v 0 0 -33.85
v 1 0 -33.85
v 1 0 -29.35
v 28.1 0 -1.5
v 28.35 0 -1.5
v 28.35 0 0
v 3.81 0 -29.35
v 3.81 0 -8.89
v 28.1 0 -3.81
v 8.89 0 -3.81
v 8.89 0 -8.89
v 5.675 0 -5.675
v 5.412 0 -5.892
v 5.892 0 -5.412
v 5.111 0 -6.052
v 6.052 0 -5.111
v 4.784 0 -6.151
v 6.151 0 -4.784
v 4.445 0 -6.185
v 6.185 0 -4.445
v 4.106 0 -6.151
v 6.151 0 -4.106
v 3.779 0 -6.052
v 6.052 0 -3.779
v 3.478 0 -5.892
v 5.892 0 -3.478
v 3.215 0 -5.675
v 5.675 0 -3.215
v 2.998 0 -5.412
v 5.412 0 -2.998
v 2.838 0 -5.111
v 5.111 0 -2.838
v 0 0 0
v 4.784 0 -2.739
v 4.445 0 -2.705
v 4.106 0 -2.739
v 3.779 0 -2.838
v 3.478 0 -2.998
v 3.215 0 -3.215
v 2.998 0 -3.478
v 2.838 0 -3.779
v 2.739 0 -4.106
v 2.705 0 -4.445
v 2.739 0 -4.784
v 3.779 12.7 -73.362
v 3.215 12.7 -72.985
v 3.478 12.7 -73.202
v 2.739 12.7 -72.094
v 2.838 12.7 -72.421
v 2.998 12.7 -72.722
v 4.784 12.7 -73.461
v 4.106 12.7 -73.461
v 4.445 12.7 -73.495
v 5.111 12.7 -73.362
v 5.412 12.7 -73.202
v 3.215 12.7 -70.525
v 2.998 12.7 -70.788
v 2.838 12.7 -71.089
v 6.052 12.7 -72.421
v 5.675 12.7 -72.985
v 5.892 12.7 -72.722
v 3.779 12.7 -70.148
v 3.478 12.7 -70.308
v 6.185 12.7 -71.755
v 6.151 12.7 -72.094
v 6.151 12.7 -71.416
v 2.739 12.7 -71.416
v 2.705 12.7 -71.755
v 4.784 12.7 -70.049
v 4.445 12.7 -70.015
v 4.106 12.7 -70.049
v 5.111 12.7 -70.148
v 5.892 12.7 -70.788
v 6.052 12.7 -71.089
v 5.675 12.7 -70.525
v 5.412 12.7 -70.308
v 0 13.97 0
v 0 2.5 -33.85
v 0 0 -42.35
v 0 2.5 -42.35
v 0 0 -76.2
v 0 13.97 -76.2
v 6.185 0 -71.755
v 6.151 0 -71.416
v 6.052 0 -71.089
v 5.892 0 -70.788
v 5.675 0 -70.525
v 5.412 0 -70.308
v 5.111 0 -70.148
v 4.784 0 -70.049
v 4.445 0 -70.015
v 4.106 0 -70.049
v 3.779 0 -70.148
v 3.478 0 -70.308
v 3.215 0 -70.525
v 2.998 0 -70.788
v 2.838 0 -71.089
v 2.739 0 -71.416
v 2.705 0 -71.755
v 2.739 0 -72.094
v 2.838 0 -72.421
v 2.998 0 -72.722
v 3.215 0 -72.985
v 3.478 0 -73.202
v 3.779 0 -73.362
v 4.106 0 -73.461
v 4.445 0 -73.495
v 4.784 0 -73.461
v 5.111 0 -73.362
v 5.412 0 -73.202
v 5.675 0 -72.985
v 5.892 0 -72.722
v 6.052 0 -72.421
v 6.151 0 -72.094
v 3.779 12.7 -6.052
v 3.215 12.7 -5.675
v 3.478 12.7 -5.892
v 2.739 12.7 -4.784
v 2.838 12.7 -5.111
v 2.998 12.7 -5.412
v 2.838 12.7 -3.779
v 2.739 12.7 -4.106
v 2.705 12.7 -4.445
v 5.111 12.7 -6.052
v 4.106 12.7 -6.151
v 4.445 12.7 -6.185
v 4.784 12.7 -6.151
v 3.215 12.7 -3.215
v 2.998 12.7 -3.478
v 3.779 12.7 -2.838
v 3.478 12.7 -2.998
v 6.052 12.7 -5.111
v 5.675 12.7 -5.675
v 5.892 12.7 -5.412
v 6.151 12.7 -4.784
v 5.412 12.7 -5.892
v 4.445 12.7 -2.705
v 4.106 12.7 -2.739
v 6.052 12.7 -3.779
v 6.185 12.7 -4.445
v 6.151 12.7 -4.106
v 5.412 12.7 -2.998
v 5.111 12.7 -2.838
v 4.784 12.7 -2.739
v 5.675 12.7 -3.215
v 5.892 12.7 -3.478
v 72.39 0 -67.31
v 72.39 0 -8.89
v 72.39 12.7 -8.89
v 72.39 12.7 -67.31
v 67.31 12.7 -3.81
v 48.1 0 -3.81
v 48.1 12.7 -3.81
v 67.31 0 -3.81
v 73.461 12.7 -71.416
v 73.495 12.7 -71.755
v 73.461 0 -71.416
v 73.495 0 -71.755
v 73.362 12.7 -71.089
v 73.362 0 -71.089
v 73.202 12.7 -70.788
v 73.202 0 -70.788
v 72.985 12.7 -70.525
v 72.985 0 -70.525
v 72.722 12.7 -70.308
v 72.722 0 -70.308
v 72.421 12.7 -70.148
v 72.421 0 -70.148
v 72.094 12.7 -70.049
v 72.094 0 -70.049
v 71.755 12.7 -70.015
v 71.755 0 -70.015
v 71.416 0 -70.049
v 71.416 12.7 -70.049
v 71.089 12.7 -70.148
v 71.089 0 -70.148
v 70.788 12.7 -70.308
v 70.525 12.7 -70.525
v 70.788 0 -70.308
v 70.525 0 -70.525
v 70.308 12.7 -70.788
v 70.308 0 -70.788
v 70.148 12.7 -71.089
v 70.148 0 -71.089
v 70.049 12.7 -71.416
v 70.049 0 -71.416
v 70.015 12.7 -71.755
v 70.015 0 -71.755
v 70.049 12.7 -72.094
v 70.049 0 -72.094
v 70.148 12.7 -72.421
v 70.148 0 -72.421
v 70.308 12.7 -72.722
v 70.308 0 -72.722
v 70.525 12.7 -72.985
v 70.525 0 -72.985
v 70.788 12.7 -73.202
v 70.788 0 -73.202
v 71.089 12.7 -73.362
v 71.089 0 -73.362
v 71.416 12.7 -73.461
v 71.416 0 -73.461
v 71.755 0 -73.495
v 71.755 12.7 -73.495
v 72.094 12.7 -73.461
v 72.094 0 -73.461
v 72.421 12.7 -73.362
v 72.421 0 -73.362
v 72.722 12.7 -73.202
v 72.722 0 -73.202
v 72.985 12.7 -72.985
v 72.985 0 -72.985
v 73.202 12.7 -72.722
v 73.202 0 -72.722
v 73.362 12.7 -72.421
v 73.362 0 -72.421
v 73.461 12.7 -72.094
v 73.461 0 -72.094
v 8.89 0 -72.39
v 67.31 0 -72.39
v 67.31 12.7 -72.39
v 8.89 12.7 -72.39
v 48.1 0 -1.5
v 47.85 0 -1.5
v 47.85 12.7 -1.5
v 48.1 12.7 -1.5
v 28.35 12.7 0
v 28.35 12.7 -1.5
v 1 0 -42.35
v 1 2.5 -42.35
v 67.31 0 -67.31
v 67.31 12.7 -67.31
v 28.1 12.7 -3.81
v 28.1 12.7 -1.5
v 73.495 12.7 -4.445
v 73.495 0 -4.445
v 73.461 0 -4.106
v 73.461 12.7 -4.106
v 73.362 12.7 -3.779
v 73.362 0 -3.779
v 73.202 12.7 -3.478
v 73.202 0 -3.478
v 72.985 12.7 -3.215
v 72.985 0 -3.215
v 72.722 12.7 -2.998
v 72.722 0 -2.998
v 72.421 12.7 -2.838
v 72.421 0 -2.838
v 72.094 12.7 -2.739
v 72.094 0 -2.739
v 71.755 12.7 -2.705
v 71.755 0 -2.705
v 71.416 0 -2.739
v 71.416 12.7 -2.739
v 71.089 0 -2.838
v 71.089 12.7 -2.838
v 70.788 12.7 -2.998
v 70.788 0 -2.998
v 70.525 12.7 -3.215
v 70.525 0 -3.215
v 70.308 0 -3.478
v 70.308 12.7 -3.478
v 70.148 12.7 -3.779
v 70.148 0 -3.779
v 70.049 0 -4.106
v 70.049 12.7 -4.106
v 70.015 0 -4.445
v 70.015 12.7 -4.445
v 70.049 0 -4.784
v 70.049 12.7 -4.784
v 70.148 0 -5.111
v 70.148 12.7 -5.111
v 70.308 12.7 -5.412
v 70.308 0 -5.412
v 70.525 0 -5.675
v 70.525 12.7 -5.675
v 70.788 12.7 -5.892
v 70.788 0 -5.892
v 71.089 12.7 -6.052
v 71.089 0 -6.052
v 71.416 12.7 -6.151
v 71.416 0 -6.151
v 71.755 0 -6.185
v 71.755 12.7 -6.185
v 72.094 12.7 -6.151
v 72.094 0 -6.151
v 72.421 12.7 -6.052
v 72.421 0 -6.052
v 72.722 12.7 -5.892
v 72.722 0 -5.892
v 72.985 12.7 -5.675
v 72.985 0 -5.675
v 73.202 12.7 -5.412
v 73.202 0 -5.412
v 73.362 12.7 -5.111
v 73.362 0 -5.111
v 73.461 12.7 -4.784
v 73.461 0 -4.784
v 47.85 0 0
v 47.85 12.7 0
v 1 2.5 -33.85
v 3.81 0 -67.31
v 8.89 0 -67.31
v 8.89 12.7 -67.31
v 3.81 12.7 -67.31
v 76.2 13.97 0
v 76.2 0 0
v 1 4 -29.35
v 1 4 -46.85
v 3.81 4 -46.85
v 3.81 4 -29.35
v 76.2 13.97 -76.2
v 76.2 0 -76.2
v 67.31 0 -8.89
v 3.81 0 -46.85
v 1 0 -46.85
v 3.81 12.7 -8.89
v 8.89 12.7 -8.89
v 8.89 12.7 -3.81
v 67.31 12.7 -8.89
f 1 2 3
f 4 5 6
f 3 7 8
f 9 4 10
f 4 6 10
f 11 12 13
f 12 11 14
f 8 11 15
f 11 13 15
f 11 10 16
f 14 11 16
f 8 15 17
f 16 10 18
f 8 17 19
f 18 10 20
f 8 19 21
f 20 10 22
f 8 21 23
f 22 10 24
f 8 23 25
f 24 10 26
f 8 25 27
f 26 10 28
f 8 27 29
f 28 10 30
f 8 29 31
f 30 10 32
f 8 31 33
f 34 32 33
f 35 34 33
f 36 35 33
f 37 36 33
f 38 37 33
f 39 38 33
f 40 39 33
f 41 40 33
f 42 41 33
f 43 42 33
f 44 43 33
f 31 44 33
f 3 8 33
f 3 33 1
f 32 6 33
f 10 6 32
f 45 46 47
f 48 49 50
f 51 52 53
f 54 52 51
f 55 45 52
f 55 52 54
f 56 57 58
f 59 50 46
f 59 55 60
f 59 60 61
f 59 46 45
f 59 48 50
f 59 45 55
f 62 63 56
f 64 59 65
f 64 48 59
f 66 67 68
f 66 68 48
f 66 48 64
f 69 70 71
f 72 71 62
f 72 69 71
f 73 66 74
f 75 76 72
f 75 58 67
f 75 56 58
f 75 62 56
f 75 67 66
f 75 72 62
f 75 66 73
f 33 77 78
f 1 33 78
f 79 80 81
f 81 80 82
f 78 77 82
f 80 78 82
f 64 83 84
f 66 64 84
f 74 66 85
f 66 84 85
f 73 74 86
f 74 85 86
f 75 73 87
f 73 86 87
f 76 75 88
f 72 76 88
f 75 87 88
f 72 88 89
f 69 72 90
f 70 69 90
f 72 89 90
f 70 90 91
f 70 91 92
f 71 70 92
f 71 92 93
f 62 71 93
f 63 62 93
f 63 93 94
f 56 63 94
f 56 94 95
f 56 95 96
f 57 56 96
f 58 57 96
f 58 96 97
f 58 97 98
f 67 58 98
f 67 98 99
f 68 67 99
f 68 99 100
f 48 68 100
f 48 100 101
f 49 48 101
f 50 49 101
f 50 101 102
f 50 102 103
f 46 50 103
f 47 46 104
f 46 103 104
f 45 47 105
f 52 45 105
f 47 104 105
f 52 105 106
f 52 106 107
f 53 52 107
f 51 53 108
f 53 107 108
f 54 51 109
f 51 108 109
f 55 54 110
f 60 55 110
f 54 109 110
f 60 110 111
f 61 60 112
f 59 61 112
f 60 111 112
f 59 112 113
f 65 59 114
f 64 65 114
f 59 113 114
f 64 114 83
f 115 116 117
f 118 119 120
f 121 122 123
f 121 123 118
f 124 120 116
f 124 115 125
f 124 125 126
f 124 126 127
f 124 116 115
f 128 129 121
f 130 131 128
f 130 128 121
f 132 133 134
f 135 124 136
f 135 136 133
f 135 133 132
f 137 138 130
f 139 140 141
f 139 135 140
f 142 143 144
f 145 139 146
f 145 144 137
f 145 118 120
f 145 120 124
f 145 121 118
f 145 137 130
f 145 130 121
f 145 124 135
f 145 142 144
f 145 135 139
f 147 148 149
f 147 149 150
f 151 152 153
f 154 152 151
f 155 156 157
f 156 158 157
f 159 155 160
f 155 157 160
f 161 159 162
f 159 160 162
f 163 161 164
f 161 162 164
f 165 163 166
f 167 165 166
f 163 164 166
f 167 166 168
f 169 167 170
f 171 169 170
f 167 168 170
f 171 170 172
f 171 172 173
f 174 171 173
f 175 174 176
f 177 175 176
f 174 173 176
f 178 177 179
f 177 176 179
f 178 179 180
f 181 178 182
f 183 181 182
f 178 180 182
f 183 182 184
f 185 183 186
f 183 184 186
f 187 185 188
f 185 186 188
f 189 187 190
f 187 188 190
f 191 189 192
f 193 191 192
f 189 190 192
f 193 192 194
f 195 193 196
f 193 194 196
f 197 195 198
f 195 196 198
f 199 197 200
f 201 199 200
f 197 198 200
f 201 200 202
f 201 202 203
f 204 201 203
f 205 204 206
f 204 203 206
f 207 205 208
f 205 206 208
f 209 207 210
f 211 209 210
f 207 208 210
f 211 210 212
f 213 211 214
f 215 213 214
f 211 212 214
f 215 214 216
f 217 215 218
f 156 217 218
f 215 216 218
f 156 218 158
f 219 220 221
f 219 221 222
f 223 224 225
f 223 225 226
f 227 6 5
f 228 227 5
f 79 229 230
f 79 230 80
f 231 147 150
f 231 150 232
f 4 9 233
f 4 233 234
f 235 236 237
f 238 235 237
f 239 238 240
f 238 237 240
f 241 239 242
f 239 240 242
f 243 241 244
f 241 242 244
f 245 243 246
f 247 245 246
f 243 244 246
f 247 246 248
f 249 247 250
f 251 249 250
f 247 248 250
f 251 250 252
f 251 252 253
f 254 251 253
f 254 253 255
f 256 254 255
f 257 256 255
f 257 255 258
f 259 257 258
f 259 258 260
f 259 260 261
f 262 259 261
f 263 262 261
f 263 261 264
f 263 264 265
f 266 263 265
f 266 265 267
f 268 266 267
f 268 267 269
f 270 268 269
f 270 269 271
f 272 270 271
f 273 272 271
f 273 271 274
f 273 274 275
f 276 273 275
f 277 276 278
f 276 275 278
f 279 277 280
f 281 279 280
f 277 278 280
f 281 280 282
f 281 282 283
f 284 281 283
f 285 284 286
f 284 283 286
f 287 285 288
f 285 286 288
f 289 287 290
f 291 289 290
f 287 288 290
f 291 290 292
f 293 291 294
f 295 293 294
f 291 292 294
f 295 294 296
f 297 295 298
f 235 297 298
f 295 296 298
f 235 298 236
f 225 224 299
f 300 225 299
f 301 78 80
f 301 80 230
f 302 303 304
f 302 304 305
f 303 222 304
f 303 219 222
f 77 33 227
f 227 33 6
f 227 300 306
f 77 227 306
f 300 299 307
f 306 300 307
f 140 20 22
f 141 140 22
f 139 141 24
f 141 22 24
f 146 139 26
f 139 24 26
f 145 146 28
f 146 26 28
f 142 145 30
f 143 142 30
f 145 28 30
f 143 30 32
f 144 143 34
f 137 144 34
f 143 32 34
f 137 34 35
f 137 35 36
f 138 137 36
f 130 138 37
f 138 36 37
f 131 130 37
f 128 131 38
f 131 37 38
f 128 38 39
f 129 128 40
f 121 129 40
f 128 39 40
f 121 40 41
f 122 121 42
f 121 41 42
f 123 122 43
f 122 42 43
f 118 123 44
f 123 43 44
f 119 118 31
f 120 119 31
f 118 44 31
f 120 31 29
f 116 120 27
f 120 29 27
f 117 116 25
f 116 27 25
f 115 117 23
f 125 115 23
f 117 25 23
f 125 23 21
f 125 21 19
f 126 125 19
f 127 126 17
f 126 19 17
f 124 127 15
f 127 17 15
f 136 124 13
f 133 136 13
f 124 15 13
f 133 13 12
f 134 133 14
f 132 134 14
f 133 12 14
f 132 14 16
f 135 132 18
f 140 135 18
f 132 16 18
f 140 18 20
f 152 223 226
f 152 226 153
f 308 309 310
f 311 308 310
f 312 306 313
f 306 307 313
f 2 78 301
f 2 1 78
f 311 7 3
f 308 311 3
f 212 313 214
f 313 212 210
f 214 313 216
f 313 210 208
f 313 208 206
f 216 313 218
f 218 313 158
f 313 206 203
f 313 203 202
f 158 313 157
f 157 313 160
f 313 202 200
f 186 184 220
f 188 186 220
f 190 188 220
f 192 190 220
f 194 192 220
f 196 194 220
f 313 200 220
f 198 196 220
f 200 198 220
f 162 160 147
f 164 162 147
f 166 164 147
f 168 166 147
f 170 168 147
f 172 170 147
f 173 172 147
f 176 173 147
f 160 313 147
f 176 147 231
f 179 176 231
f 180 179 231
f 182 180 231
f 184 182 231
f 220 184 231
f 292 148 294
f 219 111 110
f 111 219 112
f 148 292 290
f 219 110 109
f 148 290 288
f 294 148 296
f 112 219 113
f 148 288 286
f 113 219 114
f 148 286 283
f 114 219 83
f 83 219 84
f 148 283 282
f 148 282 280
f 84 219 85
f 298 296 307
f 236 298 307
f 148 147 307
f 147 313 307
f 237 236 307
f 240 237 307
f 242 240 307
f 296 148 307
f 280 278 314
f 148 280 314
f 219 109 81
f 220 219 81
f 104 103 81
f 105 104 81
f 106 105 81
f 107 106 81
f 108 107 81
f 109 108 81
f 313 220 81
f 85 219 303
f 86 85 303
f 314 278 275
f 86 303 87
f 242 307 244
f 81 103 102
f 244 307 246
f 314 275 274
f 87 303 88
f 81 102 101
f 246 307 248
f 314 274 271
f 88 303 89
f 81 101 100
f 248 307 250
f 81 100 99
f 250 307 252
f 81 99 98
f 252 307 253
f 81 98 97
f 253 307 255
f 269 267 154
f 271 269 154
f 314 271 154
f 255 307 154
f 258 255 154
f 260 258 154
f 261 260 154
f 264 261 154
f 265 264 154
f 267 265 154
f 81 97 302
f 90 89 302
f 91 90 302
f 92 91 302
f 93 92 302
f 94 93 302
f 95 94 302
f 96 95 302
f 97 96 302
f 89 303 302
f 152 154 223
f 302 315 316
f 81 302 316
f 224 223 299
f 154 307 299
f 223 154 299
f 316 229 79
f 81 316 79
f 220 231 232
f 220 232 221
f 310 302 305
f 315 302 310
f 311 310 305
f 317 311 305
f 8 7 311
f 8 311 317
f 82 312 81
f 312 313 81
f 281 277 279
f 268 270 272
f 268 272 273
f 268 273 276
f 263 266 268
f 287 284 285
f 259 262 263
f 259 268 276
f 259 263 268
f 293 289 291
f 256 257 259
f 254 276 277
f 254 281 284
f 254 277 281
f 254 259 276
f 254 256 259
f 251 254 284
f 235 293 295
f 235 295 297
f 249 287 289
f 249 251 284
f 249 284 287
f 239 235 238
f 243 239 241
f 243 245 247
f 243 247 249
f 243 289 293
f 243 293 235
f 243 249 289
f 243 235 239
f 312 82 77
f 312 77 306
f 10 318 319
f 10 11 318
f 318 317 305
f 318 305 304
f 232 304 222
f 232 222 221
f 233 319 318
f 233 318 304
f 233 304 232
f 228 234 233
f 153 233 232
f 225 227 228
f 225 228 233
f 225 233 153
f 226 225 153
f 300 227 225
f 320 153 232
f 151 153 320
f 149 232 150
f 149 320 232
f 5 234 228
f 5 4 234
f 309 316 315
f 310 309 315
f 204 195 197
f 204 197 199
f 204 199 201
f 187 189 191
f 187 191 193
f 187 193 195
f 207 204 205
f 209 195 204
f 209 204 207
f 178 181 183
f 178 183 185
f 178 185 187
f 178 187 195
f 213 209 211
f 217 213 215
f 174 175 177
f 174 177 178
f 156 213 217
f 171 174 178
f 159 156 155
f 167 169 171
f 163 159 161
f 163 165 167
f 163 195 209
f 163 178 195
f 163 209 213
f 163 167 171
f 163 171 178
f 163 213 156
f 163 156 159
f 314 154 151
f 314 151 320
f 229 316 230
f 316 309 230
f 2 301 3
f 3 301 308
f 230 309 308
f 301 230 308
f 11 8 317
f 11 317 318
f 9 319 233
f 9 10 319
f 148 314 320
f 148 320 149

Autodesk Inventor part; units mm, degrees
ref_plane "YZ Plane" through (0, 0, 0) normal (1, 0, 0) x (0, 1, 0)
ref_plane "XZ Plane" through (0, 0, 0) normal (0, 1, 0) x (-1, 0, 0)
ref_plane "XY Plane" through (0, 0, 0) normal (0, 0, 1) x (1, 0, 0)
sketch "Sketch1" plane through (0, 0, 0) normal (0, 1, 0) x (-1, 0, 0)
  line L0 (0, 0) -> (-76.2, 0)
  line L1 (-76.2, 0) -> (-76.2, -76.2)
  line L2 (-76.2, -76.2) -> (0, -76.2)
  line L3 (0, -76.2) -> (0, 0)
  line L4 (-8.89, -8.89) -> (-67.31, -8.89)
  line L5 (-67.31, -8.89) -> (-67.31, -67.31)
  line L6 (-67.31, -67.31) -> (-8.89, -67.31)
  line L7 (-8.89, -67.31) -> (-8.89, -8.89)
  line L8 (-8.89, -8.89) -> (-67.31, -67.31) construction
  line L9 (-67.31, -8.89) -> (-8.89, -67.31) construction
  point P0 (-38.1, -38.1)
  dimension "d0" = 76.2
  dimension "d1" = 76.2
  dimension "d2" = 58.42
  dimension "d3" = 58.42
extrude "Extrusion1" add sketch "Sketch1" along normal blind 12.7
sketch "Sketch2" plane through (0, 12.7, 0) normal (0, 1, 0) x (1, 0, 0)
  line L0 (0, 76.2) -> (0, 0) projected
  line L1 (76.2, 0) -> (76.2, 76.2) projected
  line L2 (0, 0) -> (76.2, 0)
  line L3 (76.2, 0) -> (76.2, 76.2)
  line L4 (76.2, 76.2) -> (0, 76.2)
  line L5 (0, 76.2) -> (0, 0)
extrude "Extrusion2" add sketch "Sketch2" along normal blind 1.27
sketch "Sketch3" plane through (0, 0, 0) normal (0, -1, 0) x (1, 0, 0)
  line L0 (67.31, -67.31) -> (67.31, -8.89) construction
  line L1 (76.2, 0) -> (76.2, -76.2) construction
  line L2 (67.31, -8.89) -> (76.2, 0) construction
  line L3 (67.31, -67.31) -> (76.2, -76.2) construction
  line L4 (8.89, -67.31) -> (0, -76.2) construction
  line L5 (8.89, -8.89) -> (8.89, -67.31) construction
  line L6 (8.89, -8.89) -> (0, 0) construction
  circle A0 centre (71.755, -4.445) radius 1.7399
  circle A1 centre (71.755, -71.755) radius 1.7399
  circle A2 centre (4.445, -4.445) radius 1.7399
  circle A3 centre (4.445, -71.755) radius 1.7399
  dimension "d8" = 3.4798
  dimension "d9" = 3.4798
  dimension "d10" = 3.4798
  dimension "d11" = 3.4798
extrude "Extrusion3" cut sketch "Sketch3" against normal blind 12.7
sketch "Sketch4" plane through (0, 0, 0) normal (0, -1, 0) x (1, 0, 0)
  line L0 (67.31, -67.31) -> (67.31, -8.89) projected
  line L1 (67.31, -8.89) -> (72.39, -8.89)
  line L2 (72.39, -8.89) -> (72.39, -67.31)
  line L3 (72.39, -67.31) -> (67.31, -67.31)
  line L4 (67.31, -67.31) -> (67.31, -8.89)
  circle A0 centre (38.1, -38.1) radius 2.0553 construction
  line L5 (8.89, -3.81) -> (67.31, -3.81)
  line L6 (8.89, -8.89) -> (8.89, -3.81)
  line L7 (67.31, -8.89) -> (8.89, -8.89)
  line L8 (67.31, -3.81) -> (67.31, -8.89)
  line L9 (3.81, -67.31) -> (3.81, -8.89)
  line L10 (8.89, -67.31) -> (3.81, -67.31)
  line L11 (8.89, -8.89) -> (8.89, -67.31)
  line L12 (3.81, -8.89) -> (8.89, -8.89)
  line L13 (67.31, -72.39) -> (8.89, -72.39)
  line L14 (67.31, -67.31) -> (67.31, -72.39)
  line L15 (8.89, -67.31) -> (67.31, -67.31)
  line L16 (8.89, -72.39) -> (8.89, -67.31)
  point P0 (0, 0)
  dimension "d14" = 5.08
  dimension "d17" = 360
extrude "Extrusion4" cut sketch "Sketch4" against normal blind 12.7 contours L0 L1 L2 L3 | L14 L13 L16 L15 | L7 L6 L5 L8 | L10 L9 L12 L11
sketch "Sketch5" plane through (0, 0, 0) normal (0, -1, 0) x (1, 0, 0)
  line L0 (0, 0) -> (76.2, 0) projected
  line L1 (47.85, 0) -> (28.35, 0)
  line L2 (28.35, 0) -> (28.35, -1.5)
  line L3 (28.35, -1.5) -> (38.1, -1.5)
  line L4 (47.85, -1.5) -> (47.85, 0)
  line L5 (8.89, -3.81) -> (67.31, -3.81) construction
  line L6 (38.1, -3.81) -> (38.1, 0) construction
  line L7 (48.1, -3.81) -> (28.1, -3.81)
  line L8 (28.1, -3.81) -> (28.1, -1.5)
  line L9 (48.1, -1.5) -> (48.1, -3.81)
  line L10 (28.1, -1.5) -> (38.1, -1.5)
  line L11 (47.85, -1.5) -> (48.1, -1.5)
  point P0 (28.35, 0)
  dimension "d21" = 19.5
  dimension "d22" = 1.5
  dimension "d23" = 20
extrude "Extrusion5" cut sketch "Sketch5" against normal blind 12.7
sketch "Sketch6" plane through (0, 0, 0) normal (0, -1, 0) x (1, 0, 0)
  line L0 (0, -76.2) -> (0, 0) projected
  line L1 (0, -33.85) -> (1, -33.85)
  line L2 (1, -33.85) -> (1, -42.35)
  line L3 (1, -42.35) -> (0, -42.35)
  line L4 (0, -42.35) -> (0, -33.85)
  line L5 (3.81, -67.31) -> (3.81, -8.89) construction
  line L6 (3.81, -38.1) -> (0, -38.1) construction
  line L7 (3.81, -29.35) -> (1, -29.35)
  line L8 (1, -29.35) -> (1, -46.85)
  line L9 (1, -46.85) -> (3.81, -46.85)
  line L10 (3.81, -46.85) -> (3.81, -29.35)
  dimension "d26" = 1
  dimension "d27" = 8.5
  dimension "d28" = 17.5
extrude "Extrusion6" cut sketch "Sketch6" against normal blind 4
sketch "Sketch7" plane through (0, 4, 0) normal (0, -1, 0) x (1, 0, 0)
  line L0 (1, -33.85) -> (1, -29.35) projected
  line L1 (0, -76.2) -> (0, -42.35) projected
  line L2 (1, -33.85) -> (0, -33.85)
  line L3 (0, -33.85) -> (0, -42.35)
  line L4 (0, -42.35) -> (1, -42.35)
  line L5 (1, -42.35) -> (1, -33.85)
  point P0 (0, 0)
extrude "Extrusion7" add sketch "Sketch7" along normal blind 1.5
properties part number "keypad cover good"
